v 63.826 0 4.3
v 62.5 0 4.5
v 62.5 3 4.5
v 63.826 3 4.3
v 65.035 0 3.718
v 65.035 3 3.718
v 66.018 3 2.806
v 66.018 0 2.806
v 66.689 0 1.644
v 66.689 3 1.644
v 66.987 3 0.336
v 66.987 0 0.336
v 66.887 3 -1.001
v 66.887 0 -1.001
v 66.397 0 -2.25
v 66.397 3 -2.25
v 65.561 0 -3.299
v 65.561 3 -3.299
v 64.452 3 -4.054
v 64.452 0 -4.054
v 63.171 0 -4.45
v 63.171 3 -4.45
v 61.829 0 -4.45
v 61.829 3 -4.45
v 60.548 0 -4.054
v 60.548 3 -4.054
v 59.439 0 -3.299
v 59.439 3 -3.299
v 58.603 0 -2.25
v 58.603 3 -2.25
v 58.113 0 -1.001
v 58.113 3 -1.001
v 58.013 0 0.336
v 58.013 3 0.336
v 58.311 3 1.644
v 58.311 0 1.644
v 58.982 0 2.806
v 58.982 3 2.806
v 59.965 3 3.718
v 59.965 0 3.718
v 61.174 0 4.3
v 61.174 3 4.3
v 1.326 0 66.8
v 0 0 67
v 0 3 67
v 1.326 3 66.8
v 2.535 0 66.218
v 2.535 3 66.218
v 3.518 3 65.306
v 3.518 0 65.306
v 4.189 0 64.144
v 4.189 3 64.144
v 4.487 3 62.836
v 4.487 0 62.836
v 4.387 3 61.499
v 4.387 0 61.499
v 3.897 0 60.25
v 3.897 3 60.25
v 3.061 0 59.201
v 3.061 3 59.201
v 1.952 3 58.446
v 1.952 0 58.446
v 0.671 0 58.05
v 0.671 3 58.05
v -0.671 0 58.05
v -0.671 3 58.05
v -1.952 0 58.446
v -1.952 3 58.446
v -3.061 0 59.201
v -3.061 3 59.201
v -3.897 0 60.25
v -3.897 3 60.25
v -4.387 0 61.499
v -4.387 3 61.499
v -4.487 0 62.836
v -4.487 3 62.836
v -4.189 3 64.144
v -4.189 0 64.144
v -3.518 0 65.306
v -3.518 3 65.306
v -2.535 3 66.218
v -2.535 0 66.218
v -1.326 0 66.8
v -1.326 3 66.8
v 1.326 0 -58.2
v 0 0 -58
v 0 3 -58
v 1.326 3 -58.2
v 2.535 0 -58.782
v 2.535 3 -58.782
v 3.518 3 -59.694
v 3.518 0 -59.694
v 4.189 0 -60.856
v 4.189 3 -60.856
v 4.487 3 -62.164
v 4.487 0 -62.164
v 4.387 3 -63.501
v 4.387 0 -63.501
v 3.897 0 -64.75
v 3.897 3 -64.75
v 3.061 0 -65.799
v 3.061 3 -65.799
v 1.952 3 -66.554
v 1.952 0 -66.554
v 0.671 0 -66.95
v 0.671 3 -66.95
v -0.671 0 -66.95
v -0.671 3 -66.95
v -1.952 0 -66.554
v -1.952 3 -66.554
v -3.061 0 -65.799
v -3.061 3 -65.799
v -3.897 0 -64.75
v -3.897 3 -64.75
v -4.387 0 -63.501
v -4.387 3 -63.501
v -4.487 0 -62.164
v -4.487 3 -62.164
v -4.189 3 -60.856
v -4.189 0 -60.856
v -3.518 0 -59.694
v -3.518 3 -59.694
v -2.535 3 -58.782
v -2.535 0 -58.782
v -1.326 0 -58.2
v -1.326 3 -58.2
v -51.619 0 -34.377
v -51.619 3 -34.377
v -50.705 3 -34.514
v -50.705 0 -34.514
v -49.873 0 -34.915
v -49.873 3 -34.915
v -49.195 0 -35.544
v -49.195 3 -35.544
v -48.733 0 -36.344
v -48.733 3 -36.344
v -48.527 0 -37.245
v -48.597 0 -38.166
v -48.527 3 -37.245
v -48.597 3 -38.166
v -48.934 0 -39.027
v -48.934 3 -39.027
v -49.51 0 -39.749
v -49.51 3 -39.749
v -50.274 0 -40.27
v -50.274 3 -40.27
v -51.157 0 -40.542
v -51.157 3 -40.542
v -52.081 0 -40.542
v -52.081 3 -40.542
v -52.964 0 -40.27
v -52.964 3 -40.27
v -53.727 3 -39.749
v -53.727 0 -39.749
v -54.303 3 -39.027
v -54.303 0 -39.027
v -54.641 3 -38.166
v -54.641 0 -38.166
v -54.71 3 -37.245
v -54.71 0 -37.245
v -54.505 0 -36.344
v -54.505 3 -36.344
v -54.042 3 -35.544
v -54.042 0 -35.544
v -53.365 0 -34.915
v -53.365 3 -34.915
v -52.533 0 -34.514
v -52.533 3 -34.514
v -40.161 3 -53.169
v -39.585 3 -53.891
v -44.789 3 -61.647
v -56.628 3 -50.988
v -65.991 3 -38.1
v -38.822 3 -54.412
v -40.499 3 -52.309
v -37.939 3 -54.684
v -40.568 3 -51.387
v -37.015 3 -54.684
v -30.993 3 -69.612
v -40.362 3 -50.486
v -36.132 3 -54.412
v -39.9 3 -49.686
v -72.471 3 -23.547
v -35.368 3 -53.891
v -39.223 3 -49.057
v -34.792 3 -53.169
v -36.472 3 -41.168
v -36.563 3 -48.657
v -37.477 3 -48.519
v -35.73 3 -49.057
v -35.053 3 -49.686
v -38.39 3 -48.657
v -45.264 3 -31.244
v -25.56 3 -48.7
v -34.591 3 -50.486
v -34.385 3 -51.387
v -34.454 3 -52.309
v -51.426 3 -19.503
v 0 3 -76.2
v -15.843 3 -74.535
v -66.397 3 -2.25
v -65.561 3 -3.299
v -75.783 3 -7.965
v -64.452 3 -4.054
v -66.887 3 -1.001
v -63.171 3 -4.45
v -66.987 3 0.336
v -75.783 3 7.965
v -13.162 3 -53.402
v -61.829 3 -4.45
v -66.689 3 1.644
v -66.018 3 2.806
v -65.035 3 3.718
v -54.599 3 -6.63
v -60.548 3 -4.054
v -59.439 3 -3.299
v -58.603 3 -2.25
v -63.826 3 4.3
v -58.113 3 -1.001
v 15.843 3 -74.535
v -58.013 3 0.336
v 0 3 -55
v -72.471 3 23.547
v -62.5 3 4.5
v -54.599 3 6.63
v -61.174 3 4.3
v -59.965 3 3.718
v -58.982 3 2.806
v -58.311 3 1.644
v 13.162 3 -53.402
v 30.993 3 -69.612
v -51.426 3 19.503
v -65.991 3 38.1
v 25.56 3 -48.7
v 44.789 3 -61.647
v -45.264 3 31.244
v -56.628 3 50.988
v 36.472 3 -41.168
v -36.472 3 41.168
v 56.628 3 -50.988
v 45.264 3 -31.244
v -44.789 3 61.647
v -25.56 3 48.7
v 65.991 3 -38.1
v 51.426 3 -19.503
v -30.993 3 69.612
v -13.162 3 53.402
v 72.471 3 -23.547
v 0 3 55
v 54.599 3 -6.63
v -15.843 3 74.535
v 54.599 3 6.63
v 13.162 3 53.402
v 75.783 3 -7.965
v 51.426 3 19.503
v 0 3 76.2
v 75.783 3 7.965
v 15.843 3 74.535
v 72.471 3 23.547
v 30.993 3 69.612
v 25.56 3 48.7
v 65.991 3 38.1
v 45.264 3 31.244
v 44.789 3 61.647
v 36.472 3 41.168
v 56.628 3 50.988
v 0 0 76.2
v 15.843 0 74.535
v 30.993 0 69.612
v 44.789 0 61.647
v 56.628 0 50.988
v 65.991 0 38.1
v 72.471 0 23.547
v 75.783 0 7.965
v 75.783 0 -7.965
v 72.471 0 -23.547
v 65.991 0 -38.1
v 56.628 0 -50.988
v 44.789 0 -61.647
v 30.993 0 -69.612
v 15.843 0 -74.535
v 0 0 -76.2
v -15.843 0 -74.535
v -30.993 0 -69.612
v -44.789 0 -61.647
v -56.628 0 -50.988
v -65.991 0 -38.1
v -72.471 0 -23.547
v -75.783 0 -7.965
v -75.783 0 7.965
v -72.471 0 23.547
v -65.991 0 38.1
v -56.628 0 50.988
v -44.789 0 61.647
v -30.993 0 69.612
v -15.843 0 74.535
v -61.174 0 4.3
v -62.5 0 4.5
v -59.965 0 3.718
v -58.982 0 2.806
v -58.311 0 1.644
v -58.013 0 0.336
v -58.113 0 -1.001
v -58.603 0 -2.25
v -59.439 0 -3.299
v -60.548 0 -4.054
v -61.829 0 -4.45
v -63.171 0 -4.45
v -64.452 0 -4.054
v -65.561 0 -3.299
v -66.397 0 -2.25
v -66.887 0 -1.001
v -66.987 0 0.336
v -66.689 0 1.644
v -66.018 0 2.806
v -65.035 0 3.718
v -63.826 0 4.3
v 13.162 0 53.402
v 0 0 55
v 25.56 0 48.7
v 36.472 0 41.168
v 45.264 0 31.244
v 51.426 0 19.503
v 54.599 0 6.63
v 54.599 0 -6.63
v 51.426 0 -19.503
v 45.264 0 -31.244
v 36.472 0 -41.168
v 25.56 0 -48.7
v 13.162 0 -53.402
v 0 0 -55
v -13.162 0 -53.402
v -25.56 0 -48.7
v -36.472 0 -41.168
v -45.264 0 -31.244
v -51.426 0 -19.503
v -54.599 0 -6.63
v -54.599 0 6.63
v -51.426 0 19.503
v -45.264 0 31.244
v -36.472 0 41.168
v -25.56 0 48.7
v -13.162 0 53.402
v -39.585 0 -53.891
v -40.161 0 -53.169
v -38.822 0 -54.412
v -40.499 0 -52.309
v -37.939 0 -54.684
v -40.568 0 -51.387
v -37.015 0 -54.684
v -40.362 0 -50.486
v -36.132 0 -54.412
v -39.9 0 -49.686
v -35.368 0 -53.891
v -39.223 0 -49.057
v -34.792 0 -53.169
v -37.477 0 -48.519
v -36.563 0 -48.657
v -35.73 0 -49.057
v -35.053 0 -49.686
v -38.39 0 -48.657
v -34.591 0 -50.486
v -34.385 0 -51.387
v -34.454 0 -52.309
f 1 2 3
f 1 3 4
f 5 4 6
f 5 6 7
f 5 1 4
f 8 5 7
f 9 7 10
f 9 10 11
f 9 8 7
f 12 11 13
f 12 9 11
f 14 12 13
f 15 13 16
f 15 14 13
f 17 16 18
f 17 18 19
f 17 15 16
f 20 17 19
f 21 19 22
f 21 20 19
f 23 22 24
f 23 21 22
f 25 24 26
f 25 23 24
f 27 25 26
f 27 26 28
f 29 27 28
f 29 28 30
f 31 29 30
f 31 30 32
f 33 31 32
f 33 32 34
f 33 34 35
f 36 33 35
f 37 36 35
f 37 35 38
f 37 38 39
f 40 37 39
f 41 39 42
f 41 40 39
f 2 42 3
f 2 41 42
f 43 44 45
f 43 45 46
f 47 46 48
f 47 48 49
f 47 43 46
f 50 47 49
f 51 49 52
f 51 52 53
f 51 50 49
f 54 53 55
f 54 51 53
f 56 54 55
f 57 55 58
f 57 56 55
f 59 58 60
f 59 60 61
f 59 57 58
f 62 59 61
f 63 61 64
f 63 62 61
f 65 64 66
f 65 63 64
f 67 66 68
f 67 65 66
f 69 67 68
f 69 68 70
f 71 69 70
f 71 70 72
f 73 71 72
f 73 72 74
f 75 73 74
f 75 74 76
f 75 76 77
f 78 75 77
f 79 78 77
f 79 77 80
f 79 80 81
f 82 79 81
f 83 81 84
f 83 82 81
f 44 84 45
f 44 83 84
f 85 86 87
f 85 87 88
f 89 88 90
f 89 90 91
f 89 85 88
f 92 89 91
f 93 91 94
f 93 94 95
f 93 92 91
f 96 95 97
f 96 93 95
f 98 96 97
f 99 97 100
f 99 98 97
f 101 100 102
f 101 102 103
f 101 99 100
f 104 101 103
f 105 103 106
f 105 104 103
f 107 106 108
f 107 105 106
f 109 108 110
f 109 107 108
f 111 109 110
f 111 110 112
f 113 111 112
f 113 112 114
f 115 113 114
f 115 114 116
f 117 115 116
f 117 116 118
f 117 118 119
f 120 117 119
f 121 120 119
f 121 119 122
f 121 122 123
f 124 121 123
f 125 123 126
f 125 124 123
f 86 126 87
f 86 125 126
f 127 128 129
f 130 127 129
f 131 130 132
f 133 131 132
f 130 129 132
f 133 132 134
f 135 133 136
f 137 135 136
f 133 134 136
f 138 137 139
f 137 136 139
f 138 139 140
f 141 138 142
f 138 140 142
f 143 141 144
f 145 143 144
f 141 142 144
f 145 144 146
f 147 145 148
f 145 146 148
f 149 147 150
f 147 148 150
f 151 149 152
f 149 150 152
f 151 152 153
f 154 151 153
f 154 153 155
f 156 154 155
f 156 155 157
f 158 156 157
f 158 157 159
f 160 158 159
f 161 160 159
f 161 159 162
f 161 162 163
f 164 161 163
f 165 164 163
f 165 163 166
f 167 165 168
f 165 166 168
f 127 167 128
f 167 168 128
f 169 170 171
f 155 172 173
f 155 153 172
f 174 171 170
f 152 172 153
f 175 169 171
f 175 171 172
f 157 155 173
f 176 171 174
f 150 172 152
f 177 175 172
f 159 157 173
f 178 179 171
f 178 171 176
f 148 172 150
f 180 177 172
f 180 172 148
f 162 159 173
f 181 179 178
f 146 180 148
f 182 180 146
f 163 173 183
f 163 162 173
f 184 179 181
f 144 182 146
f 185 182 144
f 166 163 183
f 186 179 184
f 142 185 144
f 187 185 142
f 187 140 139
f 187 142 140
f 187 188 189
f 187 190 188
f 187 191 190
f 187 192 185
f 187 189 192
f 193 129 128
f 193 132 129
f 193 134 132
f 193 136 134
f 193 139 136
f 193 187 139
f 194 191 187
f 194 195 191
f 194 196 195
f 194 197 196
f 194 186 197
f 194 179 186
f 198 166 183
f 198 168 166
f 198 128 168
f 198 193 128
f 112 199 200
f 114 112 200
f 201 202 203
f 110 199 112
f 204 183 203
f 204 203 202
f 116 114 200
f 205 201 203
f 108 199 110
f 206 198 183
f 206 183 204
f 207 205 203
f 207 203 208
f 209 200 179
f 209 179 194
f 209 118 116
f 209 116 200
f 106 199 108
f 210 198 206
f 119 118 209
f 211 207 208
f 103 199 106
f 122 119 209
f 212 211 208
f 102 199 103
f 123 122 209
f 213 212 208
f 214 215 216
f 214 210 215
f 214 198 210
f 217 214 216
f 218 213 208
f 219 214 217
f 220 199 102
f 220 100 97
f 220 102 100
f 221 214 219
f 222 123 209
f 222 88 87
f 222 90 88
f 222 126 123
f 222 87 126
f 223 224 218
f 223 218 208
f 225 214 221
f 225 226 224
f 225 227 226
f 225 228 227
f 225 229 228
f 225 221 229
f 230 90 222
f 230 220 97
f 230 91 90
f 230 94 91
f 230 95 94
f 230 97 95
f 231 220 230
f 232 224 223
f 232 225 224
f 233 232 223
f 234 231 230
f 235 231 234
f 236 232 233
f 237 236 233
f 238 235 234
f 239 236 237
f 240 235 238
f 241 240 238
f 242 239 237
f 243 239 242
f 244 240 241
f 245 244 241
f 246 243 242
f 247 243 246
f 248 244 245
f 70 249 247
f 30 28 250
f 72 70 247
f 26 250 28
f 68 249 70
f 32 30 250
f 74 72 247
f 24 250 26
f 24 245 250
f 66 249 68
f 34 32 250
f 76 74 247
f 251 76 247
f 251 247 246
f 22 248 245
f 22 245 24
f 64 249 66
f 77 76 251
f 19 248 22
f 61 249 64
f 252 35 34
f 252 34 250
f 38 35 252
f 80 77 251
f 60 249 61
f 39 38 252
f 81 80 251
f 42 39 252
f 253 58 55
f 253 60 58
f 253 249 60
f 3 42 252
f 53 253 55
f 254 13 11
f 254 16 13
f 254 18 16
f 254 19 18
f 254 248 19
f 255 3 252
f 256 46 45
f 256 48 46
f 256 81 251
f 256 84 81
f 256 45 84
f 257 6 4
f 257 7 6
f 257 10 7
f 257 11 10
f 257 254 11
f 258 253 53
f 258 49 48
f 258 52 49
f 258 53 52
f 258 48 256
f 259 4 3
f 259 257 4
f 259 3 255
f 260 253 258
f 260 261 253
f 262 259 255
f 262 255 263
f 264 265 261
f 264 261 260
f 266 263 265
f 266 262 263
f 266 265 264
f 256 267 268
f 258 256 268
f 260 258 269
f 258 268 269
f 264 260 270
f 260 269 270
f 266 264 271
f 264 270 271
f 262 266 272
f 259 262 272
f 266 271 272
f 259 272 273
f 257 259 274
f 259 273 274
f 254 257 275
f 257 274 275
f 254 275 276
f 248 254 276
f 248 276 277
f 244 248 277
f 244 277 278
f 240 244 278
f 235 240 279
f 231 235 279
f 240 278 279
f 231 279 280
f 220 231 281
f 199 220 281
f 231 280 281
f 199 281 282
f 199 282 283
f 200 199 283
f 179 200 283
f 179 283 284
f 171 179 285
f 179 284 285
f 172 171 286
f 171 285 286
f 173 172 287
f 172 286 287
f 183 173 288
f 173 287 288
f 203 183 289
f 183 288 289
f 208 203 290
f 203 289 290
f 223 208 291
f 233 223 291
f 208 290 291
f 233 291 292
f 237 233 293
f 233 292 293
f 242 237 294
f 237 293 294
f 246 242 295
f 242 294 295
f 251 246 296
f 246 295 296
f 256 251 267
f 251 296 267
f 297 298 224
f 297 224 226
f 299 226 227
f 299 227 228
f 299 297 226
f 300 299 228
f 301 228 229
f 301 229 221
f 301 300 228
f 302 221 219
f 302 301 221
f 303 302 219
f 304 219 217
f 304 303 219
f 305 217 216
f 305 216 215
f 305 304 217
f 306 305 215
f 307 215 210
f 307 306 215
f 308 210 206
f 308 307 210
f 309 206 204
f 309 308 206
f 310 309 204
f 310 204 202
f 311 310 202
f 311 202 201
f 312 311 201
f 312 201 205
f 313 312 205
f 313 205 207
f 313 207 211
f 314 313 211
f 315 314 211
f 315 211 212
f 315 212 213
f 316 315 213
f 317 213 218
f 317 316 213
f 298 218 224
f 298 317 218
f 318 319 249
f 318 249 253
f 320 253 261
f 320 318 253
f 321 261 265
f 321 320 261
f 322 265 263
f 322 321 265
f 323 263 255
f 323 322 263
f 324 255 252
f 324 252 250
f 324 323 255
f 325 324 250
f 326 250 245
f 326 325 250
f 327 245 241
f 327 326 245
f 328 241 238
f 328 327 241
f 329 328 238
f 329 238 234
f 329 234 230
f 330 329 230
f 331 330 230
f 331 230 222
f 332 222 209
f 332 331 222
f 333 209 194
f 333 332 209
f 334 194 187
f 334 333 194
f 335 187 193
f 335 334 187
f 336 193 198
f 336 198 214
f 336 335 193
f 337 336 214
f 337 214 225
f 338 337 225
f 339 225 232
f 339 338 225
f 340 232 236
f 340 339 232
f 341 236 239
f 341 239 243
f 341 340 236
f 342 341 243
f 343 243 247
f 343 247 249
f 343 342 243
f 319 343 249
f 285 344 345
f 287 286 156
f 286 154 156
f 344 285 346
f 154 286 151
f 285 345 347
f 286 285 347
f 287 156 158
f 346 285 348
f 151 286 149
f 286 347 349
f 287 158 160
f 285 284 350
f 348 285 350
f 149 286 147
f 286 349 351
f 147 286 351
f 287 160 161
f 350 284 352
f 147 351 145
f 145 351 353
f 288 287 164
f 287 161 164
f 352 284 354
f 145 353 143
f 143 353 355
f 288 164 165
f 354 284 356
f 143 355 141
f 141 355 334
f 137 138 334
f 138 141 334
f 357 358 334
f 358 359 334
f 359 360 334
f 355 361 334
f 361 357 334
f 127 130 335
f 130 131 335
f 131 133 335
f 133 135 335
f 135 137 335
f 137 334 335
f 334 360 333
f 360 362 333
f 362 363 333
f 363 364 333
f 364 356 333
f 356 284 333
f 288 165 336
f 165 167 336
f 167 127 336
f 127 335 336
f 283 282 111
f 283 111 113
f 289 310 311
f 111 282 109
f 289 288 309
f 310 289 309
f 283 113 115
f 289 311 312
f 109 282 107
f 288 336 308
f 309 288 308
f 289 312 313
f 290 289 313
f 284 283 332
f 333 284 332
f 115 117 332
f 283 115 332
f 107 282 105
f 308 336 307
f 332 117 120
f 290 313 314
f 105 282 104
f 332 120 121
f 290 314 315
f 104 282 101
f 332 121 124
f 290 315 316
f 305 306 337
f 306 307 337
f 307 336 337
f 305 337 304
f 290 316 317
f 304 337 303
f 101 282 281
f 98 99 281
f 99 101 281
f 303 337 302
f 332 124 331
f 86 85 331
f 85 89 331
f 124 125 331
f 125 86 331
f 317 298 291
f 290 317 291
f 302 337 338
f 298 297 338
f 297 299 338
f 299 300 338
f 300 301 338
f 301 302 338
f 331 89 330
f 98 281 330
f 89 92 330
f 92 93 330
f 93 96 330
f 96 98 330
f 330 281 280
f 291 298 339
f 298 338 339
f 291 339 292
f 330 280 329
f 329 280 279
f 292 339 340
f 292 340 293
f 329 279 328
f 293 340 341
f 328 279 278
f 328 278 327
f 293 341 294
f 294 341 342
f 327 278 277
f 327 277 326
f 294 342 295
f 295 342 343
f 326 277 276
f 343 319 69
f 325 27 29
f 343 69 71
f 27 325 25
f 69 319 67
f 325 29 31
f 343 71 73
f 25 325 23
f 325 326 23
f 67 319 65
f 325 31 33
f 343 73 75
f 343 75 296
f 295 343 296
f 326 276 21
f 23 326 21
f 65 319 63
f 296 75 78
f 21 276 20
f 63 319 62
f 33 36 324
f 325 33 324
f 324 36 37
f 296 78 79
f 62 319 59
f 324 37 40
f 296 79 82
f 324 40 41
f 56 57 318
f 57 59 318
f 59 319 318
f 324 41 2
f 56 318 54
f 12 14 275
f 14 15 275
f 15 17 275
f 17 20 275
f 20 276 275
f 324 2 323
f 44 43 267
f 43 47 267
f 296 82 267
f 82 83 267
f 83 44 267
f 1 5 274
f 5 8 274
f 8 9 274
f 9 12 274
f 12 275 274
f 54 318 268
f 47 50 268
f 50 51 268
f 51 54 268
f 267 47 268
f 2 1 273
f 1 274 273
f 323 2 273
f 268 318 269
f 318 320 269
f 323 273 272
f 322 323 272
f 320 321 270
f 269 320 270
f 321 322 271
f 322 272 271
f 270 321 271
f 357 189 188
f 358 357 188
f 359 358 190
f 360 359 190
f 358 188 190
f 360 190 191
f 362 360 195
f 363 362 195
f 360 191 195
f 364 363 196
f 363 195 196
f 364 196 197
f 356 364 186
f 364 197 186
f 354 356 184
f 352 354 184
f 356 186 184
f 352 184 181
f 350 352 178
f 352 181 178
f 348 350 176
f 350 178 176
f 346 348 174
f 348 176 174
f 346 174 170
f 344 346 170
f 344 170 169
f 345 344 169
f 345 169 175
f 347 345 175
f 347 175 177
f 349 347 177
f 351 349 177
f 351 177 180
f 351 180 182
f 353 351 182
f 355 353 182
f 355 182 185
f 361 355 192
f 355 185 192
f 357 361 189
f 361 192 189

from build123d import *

# Parameters (mm, degrees)
SKETCH1_R           = 76.2
SKETCH1_R_2         = 4.5
SKETCH1_R_3         = 55
BOSS_EXTRUDE1_DEPTH = 3
SKETCH2_R           = 3.1
CUT_EXTRUDE1_DEPTH  = 3


with BuildPart() as part:
    # Sketch1 → Boss-Extrude1 (new body)
    with BuildSketch(Plane(origin=(0, 0, 0), x_dir=(1, 0, 0), z_dir=(0, 1, 0))):
        with Locations(Location((0, 0, 0), (0, 0, 270))):
            Circle(SKETCH1_R)
        with Locations(Location((0, 62.5, 0), (0, 0, 270))):
            Circle(SKETCH1_R_2, mode=Mode.SUBTRACT)
        with Locations(Location((62.5, 0, 0), (0, 0, 270))):
            Circle(SKETCH1_R_2, mode=Mode.SUBTRACT)
        with Locations(Location((0, -62.5, 0), (0, 0, 270))):
            Circle(SKETCH1_R_2, mode=Mode.SUBTRACT)
        with Locations(Location((-62.5, 0, 0), (0, 0, 270))):
            Circle(SKETCH1_R_2, mode=Mode.SUBTRACT)
        with Locations(Location((0, 0, 0), (0, 0, 270))):
            Circle(SKETCH1_R_3, mode=Mode.SUBTRACT)
    extrude(amount=BOSS_EXTRUDE1_DEPTH)

    # Sketch2 → Cut-Extrude1 (cut)
    with BuildSketch(Plane(origin=(0, 3, 0), x_dir=(1, 0, 0), z_dir=(0, 1, 0))):
        with Locations(Location((-51.618795027, 37.476659403, 0), (0, 0, 270))):
            Circle(SKETCH2_R)
        with Locations(Location((-37.476659403, 51.618795027, 0), (0, 0, 270))):
            Circle(SKETCH2_R)
    extrude(amount=-CUT_EXTRUDE1_DEPTH, mode=Mode.SUBTRACT)


solid = part.part
